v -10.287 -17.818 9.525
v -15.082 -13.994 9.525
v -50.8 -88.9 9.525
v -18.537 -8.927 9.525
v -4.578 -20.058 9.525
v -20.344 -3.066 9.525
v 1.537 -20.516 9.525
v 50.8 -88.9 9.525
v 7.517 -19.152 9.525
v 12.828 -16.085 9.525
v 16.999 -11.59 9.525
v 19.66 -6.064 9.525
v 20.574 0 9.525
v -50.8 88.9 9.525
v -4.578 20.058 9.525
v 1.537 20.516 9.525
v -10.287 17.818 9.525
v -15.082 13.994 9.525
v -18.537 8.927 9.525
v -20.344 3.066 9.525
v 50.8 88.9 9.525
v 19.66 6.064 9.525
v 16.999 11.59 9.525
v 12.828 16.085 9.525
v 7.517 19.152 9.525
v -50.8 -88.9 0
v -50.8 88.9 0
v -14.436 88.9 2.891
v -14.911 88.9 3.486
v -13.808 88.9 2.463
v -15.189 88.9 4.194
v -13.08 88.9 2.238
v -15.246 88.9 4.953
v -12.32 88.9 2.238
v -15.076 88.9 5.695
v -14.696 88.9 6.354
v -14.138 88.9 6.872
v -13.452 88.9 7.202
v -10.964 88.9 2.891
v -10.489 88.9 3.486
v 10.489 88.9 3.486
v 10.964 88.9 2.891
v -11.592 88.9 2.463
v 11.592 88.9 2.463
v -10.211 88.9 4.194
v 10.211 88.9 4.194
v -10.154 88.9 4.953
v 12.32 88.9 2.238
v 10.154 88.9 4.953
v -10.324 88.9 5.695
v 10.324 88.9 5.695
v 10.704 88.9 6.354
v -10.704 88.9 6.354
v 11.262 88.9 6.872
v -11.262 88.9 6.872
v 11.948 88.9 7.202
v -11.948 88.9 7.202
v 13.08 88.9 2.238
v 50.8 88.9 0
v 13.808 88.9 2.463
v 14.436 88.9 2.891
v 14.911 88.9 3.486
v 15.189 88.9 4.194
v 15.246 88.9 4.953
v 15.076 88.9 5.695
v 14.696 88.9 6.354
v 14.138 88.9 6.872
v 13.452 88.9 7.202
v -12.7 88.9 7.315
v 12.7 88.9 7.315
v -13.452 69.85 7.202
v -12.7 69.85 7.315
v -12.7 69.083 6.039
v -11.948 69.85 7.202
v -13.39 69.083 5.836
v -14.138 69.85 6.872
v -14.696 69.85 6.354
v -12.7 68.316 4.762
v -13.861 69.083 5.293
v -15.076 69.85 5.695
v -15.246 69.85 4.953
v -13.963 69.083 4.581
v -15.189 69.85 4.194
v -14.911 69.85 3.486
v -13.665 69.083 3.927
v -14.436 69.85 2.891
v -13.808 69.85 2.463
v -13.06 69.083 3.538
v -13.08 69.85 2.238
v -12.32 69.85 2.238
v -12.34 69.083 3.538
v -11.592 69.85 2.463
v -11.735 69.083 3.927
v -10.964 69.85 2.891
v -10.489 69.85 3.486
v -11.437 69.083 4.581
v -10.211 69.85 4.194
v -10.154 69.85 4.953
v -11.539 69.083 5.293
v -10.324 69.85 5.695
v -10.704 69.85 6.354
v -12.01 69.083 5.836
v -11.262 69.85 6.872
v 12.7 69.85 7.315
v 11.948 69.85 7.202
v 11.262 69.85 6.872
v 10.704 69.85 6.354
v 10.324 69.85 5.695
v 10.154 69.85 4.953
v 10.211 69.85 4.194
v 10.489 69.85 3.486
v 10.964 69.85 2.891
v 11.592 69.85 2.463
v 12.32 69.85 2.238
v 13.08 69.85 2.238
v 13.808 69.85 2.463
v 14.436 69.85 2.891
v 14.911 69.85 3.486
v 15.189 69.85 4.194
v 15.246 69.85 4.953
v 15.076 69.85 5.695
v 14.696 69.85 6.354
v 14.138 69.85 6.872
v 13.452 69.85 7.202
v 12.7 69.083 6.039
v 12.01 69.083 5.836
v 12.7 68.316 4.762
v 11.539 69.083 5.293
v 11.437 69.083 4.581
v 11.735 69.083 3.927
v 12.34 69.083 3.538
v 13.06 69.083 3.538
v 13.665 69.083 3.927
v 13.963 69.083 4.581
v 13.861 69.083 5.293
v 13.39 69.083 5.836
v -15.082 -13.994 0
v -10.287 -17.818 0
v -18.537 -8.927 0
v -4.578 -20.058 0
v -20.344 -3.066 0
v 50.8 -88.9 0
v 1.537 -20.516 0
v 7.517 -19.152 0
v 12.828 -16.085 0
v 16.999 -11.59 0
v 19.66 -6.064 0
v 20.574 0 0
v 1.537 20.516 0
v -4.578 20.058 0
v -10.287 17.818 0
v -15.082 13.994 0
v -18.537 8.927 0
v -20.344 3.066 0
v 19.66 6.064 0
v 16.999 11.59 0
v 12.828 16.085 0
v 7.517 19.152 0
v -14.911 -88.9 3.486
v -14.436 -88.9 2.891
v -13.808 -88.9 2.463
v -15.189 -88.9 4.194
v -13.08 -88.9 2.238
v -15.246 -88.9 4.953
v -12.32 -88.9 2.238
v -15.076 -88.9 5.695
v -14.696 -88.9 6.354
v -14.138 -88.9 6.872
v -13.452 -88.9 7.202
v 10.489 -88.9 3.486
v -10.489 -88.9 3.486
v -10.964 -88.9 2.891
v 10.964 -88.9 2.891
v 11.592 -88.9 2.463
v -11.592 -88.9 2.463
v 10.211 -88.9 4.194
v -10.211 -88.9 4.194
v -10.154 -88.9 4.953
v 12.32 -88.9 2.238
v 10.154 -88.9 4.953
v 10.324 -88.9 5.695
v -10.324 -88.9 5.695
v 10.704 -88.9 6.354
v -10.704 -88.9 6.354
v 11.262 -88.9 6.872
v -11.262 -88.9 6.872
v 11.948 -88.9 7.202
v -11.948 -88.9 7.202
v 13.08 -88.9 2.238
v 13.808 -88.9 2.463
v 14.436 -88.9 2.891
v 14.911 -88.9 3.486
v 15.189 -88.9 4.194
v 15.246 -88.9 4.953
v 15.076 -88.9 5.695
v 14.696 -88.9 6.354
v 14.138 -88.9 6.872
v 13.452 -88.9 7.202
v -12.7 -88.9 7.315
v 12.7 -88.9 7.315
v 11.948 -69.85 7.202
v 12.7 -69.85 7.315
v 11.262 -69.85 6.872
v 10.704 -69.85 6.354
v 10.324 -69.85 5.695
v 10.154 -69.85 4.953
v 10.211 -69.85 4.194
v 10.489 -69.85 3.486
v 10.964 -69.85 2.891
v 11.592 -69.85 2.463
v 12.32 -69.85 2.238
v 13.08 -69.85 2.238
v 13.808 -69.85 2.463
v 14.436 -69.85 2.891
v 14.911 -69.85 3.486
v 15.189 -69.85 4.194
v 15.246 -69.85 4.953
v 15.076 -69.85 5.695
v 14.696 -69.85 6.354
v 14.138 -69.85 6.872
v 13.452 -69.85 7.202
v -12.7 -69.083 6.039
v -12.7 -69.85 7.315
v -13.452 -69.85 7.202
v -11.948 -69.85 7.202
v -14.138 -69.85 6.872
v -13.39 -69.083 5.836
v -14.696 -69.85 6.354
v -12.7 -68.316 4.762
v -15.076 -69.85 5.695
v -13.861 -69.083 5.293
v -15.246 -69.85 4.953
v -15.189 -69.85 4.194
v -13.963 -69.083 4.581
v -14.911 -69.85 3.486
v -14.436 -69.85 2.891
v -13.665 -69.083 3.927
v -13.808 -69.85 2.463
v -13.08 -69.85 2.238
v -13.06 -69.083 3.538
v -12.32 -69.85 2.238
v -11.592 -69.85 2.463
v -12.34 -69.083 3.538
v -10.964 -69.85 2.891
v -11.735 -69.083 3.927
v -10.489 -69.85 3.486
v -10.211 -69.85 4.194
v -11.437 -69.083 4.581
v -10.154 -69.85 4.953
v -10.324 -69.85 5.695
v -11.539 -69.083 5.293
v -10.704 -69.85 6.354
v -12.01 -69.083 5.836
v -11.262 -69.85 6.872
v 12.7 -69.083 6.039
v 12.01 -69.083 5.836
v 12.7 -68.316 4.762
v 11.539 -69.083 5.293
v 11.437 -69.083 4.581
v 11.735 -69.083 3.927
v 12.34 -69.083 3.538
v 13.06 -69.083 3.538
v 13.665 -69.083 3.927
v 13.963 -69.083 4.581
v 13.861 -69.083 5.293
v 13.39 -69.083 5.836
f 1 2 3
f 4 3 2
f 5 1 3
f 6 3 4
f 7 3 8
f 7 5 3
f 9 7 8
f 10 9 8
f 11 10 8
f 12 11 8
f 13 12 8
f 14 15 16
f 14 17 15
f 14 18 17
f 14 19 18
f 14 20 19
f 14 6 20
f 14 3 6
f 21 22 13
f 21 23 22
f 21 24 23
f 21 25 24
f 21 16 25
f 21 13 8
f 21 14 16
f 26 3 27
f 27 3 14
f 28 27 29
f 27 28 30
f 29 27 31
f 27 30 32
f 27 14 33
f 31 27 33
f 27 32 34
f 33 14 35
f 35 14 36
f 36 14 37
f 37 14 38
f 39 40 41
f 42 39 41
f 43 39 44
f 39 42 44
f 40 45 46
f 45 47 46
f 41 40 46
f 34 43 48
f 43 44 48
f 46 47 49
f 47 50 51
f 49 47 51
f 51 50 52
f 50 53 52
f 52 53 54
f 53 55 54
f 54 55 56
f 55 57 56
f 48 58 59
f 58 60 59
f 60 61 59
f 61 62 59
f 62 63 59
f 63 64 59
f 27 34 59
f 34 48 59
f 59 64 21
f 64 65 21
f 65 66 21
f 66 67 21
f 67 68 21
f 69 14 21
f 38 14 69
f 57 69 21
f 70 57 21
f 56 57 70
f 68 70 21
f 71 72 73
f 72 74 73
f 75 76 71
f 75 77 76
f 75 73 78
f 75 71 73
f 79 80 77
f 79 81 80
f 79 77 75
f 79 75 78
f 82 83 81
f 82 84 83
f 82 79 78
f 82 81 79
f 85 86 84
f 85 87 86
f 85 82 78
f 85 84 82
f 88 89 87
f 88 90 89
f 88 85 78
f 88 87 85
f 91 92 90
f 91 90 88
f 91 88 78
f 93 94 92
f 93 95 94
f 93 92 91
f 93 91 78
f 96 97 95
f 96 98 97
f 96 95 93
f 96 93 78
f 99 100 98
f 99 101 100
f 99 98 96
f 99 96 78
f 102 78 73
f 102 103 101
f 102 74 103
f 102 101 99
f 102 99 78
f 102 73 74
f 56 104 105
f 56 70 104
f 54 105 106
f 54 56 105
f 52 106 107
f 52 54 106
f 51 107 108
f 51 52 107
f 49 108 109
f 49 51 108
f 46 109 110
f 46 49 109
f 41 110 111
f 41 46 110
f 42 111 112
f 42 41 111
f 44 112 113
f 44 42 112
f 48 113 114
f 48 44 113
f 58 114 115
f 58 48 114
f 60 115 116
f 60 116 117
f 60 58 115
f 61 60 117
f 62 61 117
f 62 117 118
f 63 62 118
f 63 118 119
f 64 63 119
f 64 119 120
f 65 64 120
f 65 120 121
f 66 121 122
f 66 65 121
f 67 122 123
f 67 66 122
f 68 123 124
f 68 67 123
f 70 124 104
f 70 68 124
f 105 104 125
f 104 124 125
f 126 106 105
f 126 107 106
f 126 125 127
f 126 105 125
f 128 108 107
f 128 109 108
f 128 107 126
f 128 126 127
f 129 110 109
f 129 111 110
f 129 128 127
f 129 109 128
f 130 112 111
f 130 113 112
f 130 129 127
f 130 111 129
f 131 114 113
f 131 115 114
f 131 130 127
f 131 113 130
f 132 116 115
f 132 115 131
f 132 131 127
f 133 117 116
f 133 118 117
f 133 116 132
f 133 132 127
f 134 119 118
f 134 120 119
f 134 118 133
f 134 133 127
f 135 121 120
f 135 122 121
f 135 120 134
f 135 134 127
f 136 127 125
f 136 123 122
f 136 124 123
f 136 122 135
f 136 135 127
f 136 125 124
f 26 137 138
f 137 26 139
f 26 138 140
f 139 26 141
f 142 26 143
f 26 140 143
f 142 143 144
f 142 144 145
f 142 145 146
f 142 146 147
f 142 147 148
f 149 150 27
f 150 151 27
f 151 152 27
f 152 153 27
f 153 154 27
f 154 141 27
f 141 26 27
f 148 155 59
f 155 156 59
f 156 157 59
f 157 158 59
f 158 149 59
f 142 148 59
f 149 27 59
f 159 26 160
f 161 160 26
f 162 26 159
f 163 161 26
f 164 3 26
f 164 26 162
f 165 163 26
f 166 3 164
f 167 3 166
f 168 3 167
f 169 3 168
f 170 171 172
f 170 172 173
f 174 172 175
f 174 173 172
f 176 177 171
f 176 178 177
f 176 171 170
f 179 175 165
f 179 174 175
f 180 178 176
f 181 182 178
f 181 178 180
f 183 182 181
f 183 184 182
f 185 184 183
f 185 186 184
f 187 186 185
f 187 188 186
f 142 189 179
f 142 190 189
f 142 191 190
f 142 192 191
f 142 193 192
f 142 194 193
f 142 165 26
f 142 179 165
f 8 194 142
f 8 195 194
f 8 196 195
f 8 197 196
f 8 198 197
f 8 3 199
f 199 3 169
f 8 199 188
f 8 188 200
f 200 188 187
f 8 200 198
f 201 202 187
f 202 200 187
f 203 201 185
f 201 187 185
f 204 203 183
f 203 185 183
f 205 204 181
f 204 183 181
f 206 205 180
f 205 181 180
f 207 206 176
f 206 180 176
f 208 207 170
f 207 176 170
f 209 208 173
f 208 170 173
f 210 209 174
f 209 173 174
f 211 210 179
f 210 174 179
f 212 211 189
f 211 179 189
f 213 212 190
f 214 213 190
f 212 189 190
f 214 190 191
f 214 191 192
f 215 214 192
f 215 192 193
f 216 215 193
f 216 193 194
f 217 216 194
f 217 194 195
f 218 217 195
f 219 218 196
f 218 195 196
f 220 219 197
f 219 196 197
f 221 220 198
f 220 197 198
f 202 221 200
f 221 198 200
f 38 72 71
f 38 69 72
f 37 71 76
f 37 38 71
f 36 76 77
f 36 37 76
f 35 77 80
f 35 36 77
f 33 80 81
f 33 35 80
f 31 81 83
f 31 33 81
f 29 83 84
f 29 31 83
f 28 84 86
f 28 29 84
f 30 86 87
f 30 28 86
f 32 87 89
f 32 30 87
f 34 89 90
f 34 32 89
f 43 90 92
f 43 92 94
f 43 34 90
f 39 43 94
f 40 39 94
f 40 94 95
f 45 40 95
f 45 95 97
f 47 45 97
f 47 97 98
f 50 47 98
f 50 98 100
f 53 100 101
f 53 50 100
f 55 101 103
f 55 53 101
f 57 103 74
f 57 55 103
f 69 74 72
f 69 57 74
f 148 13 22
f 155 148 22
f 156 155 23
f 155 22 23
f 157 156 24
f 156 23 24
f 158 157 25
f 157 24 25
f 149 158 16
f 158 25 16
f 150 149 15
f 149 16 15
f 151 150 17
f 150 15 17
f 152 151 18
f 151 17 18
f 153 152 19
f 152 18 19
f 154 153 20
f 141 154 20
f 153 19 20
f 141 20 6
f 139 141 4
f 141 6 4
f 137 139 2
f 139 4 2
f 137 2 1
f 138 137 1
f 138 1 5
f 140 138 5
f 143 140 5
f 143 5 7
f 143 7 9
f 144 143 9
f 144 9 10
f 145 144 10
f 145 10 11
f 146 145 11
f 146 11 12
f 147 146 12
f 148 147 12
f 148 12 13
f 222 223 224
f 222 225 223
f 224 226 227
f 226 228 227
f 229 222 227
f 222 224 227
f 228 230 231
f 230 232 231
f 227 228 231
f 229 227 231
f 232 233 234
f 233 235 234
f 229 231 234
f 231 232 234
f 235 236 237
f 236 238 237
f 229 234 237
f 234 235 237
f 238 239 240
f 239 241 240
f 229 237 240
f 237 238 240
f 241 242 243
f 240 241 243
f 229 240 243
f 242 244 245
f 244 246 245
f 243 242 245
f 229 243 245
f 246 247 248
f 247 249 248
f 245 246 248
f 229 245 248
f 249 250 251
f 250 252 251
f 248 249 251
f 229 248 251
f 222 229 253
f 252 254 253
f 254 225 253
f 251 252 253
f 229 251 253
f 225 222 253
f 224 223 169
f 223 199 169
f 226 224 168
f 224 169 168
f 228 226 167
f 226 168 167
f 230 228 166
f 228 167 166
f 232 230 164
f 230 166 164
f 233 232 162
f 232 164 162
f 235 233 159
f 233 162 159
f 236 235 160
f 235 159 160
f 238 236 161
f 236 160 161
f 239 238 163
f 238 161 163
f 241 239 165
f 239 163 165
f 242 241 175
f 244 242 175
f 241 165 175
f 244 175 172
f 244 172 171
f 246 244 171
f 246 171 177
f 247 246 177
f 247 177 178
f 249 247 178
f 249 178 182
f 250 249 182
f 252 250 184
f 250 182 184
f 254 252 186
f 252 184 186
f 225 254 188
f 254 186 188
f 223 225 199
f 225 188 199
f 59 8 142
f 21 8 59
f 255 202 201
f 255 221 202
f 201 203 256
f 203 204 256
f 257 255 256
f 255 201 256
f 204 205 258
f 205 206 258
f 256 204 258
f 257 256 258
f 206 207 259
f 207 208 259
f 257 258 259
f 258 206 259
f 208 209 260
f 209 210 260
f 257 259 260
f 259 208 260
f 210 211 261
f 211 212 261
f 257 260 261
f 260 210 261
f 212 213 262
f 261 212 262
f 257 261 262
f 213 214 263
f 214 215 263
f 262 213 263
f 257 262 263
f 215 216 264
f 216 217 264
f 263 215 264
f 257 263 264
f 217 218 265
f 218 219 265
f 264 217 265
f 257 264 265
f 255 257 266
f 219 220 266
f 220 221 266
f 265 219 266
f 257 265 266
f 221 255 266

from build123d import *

# Parameters (mm, degrees)
SKETCH1_W                        = 203.2
SKETCH1_H                        = 304.8
BOSS_EXTRUDE1_DEPTH              = 9.525
CUT_EXTRUDE1_REACH               = 185.41
SKETCH2_R                        = 20.574
CUT_EXTRUDE2_REACH               = 185.41
SKETCH3_W                        = 203.2
SKETCH3_H                        = 63.5
F_1_4_20_TAPPED_HOLE1_AT_2_COUNT = 2
F_1_4_20_TAPPED_HOLE1_AT_2_PITCH = 25.4
CUT_EXTRUDE3_REACH               = 137.338
SKETCH6_W                        = 50.8
SKETCH6_H                        = 177.8


with BuildPart() as part:
    # Sketch1 → Boss-Extrude1 (new body)
    with BuildSketch(Plane.XY):
        Rectangle(SKETCH1_W, SKETCH1_H)
    extrude(amount=BOSS_EXTRUDE1_DEPTH)

    # Sketch2 → Cut-Extrude1 (cut, up to next)
    with BuildSketch(Plane.XY.offset(9.525), mode=Mode.PRIVATE) as cut_extrude1_sk1:
        Circle(SKETCH2_R)
    cut_extrude1_tool1 = extrude(cut_extrude1_sk1.sketch, amount=-CUT_EXTRUDE1_REACH, mode=Mode.PRIVATE) & part.part
    add(cut_extrude1_tool1.solids().sort_by_distance((0, 0, 9.525))[0], mode=Mode.SUBTRACT)

    # Sketch3 → Cut-Extrude2 (cut, up to next)
    with BuildSketch(Plane.XY.offset(9.525), mode=Mode.PRIVATE) as cut_extrude2_sk1:
        with Locations((0, -120.65)):
            Rectangle(SKETCH3_W, SKETCH3_H)
    cut_extrude2_tool1 = extrude(cut_extrude2_sk1.sketch, amount=-CUT_EXTRUDE2_REACH, mode=Mode.PRIVATE) & part.part
    # Sketch3 → Cut-Extrude2 (cut, up to next)
    with BuildSketch(Plane.XY.offset(9.525), mode=Mode.PRIVATE) as cut_extrude2_sk2:
        with Locations((0, 120.65)):
            Rectangle(SKETCH3_W, SKETCH3_H)
    cut_extrude2_tool2 = extrude(cut_extrude2_sk2.sketch, amount=-CUT_EXTRUDE2_REACH, mode=Mode.PRIVATE) & part.part
    add(cut_extrude2_tool1.solids().sort_by_distance((0, -120.65, 9.525))[0], mode=Mode.SUBTRACT)
    add(cut_extrude2_tool2.solids().sort_by_distance((0, 120.65, 9.525))[0], mode=Mode.SUBTRACT)

    # Sketch5 → 1/4-20 Tapped Hole1 (revolve, cut)
    with BuildSketch(Plane(origin=(-12.7, 88.9, 4.7625), x_dir=(0, 0, 1), z_dir=(1, 0, 0))):
        Polygon((0, 0), (0, 20.583816902), (2.5527, 19.05), (2.5527, 0), align=None)
    f_1_4_20_tapped_hole1 = revolve(axis=Axis((-12.7, 95.25, 4.7625), (0, -1, 0)), mode=Mode.SUBTRACT)

    # 1/4-20 Tapped Hole1 at 2: 1/4-20 Tapped Hole1 ×2
    with Locations(*[(i * F_1_4_20_TAPPED_HOLE1_AT_2_PITCH, 0, 0) for i in range(1, F_1_4_20_TAPPED_HOLE1_AT_2_COUNT)]):
        add(f_1_4_20_tapped_hole1, mode=Mode.SUBTRACT)

    # Mirror1: 1/4-20 Tapped Hole1 across plane
    add(f_1_4_20_tapped_hole1.mirror(Plane.ZX), mode=Mode.SUBTRACT)

    # Mirror1 copy 1 sketch → Mirror1 copy 1 (revolve, cut)
    with BuildSketch(Plane(origin=(12.7, -88.9, 4.7625), x_dir=(0, 0, 1), z_dir=(1, 0, 0))):
        Polygon((0, 0), (0, -20.583816902), (2.5527, -19.05), (2.5527, 0), align=None)
    revolve(axis=Axis((12.7, -95.25, 4.7625), (0, -1, 0)), mode=Mode.SUBTRACT)

    # Sketch6 → Cut-Extrude3 (cut, up to next)
    with BuildSketch(Plane.XY.offset(9.525), mode=Mode.PRIVATE) as cut_extrude3_sk1:
        with Locations((-76.2, 0)):
            Rectangle(SKETCH6_W, SKETCH6_H)
    cut_extrude3_tool1 = extrude(cut_extrude3_sk1.sketch, amount=-CUT_EXTRUDE3_REACH, mode=Mode.PRIVATE) & part.part
    # Sketch6 → Cut-Extrude3 (cut, up to next)
    with BuildSketch(Plane.XY.offset(9.525), mode=Mode.PRIVATE) as cut_extrude3_sk2:
        with Locations((76.2, 0)):
            Rectangle(SKETCH6_W, SKETCH6_H)
    cut_extrude3_tool2 = extrude(cut_extrude3_sk2.sketch, amount=-CUT_EXTRUDE3_REACH, mode=Mode.PRIVATE) & part.part
    add(cut_extrude3_tool1.solids().sort_by_distance((-76.2, 0, 9.525))[0], mode=Mode.SUBTRACT)
    add(cut_extrude3_tool2.solids().sort_by_distance((76.2, 0, 9.525))[0], mode=Mode.SUBTRACT)


solid = part.part
